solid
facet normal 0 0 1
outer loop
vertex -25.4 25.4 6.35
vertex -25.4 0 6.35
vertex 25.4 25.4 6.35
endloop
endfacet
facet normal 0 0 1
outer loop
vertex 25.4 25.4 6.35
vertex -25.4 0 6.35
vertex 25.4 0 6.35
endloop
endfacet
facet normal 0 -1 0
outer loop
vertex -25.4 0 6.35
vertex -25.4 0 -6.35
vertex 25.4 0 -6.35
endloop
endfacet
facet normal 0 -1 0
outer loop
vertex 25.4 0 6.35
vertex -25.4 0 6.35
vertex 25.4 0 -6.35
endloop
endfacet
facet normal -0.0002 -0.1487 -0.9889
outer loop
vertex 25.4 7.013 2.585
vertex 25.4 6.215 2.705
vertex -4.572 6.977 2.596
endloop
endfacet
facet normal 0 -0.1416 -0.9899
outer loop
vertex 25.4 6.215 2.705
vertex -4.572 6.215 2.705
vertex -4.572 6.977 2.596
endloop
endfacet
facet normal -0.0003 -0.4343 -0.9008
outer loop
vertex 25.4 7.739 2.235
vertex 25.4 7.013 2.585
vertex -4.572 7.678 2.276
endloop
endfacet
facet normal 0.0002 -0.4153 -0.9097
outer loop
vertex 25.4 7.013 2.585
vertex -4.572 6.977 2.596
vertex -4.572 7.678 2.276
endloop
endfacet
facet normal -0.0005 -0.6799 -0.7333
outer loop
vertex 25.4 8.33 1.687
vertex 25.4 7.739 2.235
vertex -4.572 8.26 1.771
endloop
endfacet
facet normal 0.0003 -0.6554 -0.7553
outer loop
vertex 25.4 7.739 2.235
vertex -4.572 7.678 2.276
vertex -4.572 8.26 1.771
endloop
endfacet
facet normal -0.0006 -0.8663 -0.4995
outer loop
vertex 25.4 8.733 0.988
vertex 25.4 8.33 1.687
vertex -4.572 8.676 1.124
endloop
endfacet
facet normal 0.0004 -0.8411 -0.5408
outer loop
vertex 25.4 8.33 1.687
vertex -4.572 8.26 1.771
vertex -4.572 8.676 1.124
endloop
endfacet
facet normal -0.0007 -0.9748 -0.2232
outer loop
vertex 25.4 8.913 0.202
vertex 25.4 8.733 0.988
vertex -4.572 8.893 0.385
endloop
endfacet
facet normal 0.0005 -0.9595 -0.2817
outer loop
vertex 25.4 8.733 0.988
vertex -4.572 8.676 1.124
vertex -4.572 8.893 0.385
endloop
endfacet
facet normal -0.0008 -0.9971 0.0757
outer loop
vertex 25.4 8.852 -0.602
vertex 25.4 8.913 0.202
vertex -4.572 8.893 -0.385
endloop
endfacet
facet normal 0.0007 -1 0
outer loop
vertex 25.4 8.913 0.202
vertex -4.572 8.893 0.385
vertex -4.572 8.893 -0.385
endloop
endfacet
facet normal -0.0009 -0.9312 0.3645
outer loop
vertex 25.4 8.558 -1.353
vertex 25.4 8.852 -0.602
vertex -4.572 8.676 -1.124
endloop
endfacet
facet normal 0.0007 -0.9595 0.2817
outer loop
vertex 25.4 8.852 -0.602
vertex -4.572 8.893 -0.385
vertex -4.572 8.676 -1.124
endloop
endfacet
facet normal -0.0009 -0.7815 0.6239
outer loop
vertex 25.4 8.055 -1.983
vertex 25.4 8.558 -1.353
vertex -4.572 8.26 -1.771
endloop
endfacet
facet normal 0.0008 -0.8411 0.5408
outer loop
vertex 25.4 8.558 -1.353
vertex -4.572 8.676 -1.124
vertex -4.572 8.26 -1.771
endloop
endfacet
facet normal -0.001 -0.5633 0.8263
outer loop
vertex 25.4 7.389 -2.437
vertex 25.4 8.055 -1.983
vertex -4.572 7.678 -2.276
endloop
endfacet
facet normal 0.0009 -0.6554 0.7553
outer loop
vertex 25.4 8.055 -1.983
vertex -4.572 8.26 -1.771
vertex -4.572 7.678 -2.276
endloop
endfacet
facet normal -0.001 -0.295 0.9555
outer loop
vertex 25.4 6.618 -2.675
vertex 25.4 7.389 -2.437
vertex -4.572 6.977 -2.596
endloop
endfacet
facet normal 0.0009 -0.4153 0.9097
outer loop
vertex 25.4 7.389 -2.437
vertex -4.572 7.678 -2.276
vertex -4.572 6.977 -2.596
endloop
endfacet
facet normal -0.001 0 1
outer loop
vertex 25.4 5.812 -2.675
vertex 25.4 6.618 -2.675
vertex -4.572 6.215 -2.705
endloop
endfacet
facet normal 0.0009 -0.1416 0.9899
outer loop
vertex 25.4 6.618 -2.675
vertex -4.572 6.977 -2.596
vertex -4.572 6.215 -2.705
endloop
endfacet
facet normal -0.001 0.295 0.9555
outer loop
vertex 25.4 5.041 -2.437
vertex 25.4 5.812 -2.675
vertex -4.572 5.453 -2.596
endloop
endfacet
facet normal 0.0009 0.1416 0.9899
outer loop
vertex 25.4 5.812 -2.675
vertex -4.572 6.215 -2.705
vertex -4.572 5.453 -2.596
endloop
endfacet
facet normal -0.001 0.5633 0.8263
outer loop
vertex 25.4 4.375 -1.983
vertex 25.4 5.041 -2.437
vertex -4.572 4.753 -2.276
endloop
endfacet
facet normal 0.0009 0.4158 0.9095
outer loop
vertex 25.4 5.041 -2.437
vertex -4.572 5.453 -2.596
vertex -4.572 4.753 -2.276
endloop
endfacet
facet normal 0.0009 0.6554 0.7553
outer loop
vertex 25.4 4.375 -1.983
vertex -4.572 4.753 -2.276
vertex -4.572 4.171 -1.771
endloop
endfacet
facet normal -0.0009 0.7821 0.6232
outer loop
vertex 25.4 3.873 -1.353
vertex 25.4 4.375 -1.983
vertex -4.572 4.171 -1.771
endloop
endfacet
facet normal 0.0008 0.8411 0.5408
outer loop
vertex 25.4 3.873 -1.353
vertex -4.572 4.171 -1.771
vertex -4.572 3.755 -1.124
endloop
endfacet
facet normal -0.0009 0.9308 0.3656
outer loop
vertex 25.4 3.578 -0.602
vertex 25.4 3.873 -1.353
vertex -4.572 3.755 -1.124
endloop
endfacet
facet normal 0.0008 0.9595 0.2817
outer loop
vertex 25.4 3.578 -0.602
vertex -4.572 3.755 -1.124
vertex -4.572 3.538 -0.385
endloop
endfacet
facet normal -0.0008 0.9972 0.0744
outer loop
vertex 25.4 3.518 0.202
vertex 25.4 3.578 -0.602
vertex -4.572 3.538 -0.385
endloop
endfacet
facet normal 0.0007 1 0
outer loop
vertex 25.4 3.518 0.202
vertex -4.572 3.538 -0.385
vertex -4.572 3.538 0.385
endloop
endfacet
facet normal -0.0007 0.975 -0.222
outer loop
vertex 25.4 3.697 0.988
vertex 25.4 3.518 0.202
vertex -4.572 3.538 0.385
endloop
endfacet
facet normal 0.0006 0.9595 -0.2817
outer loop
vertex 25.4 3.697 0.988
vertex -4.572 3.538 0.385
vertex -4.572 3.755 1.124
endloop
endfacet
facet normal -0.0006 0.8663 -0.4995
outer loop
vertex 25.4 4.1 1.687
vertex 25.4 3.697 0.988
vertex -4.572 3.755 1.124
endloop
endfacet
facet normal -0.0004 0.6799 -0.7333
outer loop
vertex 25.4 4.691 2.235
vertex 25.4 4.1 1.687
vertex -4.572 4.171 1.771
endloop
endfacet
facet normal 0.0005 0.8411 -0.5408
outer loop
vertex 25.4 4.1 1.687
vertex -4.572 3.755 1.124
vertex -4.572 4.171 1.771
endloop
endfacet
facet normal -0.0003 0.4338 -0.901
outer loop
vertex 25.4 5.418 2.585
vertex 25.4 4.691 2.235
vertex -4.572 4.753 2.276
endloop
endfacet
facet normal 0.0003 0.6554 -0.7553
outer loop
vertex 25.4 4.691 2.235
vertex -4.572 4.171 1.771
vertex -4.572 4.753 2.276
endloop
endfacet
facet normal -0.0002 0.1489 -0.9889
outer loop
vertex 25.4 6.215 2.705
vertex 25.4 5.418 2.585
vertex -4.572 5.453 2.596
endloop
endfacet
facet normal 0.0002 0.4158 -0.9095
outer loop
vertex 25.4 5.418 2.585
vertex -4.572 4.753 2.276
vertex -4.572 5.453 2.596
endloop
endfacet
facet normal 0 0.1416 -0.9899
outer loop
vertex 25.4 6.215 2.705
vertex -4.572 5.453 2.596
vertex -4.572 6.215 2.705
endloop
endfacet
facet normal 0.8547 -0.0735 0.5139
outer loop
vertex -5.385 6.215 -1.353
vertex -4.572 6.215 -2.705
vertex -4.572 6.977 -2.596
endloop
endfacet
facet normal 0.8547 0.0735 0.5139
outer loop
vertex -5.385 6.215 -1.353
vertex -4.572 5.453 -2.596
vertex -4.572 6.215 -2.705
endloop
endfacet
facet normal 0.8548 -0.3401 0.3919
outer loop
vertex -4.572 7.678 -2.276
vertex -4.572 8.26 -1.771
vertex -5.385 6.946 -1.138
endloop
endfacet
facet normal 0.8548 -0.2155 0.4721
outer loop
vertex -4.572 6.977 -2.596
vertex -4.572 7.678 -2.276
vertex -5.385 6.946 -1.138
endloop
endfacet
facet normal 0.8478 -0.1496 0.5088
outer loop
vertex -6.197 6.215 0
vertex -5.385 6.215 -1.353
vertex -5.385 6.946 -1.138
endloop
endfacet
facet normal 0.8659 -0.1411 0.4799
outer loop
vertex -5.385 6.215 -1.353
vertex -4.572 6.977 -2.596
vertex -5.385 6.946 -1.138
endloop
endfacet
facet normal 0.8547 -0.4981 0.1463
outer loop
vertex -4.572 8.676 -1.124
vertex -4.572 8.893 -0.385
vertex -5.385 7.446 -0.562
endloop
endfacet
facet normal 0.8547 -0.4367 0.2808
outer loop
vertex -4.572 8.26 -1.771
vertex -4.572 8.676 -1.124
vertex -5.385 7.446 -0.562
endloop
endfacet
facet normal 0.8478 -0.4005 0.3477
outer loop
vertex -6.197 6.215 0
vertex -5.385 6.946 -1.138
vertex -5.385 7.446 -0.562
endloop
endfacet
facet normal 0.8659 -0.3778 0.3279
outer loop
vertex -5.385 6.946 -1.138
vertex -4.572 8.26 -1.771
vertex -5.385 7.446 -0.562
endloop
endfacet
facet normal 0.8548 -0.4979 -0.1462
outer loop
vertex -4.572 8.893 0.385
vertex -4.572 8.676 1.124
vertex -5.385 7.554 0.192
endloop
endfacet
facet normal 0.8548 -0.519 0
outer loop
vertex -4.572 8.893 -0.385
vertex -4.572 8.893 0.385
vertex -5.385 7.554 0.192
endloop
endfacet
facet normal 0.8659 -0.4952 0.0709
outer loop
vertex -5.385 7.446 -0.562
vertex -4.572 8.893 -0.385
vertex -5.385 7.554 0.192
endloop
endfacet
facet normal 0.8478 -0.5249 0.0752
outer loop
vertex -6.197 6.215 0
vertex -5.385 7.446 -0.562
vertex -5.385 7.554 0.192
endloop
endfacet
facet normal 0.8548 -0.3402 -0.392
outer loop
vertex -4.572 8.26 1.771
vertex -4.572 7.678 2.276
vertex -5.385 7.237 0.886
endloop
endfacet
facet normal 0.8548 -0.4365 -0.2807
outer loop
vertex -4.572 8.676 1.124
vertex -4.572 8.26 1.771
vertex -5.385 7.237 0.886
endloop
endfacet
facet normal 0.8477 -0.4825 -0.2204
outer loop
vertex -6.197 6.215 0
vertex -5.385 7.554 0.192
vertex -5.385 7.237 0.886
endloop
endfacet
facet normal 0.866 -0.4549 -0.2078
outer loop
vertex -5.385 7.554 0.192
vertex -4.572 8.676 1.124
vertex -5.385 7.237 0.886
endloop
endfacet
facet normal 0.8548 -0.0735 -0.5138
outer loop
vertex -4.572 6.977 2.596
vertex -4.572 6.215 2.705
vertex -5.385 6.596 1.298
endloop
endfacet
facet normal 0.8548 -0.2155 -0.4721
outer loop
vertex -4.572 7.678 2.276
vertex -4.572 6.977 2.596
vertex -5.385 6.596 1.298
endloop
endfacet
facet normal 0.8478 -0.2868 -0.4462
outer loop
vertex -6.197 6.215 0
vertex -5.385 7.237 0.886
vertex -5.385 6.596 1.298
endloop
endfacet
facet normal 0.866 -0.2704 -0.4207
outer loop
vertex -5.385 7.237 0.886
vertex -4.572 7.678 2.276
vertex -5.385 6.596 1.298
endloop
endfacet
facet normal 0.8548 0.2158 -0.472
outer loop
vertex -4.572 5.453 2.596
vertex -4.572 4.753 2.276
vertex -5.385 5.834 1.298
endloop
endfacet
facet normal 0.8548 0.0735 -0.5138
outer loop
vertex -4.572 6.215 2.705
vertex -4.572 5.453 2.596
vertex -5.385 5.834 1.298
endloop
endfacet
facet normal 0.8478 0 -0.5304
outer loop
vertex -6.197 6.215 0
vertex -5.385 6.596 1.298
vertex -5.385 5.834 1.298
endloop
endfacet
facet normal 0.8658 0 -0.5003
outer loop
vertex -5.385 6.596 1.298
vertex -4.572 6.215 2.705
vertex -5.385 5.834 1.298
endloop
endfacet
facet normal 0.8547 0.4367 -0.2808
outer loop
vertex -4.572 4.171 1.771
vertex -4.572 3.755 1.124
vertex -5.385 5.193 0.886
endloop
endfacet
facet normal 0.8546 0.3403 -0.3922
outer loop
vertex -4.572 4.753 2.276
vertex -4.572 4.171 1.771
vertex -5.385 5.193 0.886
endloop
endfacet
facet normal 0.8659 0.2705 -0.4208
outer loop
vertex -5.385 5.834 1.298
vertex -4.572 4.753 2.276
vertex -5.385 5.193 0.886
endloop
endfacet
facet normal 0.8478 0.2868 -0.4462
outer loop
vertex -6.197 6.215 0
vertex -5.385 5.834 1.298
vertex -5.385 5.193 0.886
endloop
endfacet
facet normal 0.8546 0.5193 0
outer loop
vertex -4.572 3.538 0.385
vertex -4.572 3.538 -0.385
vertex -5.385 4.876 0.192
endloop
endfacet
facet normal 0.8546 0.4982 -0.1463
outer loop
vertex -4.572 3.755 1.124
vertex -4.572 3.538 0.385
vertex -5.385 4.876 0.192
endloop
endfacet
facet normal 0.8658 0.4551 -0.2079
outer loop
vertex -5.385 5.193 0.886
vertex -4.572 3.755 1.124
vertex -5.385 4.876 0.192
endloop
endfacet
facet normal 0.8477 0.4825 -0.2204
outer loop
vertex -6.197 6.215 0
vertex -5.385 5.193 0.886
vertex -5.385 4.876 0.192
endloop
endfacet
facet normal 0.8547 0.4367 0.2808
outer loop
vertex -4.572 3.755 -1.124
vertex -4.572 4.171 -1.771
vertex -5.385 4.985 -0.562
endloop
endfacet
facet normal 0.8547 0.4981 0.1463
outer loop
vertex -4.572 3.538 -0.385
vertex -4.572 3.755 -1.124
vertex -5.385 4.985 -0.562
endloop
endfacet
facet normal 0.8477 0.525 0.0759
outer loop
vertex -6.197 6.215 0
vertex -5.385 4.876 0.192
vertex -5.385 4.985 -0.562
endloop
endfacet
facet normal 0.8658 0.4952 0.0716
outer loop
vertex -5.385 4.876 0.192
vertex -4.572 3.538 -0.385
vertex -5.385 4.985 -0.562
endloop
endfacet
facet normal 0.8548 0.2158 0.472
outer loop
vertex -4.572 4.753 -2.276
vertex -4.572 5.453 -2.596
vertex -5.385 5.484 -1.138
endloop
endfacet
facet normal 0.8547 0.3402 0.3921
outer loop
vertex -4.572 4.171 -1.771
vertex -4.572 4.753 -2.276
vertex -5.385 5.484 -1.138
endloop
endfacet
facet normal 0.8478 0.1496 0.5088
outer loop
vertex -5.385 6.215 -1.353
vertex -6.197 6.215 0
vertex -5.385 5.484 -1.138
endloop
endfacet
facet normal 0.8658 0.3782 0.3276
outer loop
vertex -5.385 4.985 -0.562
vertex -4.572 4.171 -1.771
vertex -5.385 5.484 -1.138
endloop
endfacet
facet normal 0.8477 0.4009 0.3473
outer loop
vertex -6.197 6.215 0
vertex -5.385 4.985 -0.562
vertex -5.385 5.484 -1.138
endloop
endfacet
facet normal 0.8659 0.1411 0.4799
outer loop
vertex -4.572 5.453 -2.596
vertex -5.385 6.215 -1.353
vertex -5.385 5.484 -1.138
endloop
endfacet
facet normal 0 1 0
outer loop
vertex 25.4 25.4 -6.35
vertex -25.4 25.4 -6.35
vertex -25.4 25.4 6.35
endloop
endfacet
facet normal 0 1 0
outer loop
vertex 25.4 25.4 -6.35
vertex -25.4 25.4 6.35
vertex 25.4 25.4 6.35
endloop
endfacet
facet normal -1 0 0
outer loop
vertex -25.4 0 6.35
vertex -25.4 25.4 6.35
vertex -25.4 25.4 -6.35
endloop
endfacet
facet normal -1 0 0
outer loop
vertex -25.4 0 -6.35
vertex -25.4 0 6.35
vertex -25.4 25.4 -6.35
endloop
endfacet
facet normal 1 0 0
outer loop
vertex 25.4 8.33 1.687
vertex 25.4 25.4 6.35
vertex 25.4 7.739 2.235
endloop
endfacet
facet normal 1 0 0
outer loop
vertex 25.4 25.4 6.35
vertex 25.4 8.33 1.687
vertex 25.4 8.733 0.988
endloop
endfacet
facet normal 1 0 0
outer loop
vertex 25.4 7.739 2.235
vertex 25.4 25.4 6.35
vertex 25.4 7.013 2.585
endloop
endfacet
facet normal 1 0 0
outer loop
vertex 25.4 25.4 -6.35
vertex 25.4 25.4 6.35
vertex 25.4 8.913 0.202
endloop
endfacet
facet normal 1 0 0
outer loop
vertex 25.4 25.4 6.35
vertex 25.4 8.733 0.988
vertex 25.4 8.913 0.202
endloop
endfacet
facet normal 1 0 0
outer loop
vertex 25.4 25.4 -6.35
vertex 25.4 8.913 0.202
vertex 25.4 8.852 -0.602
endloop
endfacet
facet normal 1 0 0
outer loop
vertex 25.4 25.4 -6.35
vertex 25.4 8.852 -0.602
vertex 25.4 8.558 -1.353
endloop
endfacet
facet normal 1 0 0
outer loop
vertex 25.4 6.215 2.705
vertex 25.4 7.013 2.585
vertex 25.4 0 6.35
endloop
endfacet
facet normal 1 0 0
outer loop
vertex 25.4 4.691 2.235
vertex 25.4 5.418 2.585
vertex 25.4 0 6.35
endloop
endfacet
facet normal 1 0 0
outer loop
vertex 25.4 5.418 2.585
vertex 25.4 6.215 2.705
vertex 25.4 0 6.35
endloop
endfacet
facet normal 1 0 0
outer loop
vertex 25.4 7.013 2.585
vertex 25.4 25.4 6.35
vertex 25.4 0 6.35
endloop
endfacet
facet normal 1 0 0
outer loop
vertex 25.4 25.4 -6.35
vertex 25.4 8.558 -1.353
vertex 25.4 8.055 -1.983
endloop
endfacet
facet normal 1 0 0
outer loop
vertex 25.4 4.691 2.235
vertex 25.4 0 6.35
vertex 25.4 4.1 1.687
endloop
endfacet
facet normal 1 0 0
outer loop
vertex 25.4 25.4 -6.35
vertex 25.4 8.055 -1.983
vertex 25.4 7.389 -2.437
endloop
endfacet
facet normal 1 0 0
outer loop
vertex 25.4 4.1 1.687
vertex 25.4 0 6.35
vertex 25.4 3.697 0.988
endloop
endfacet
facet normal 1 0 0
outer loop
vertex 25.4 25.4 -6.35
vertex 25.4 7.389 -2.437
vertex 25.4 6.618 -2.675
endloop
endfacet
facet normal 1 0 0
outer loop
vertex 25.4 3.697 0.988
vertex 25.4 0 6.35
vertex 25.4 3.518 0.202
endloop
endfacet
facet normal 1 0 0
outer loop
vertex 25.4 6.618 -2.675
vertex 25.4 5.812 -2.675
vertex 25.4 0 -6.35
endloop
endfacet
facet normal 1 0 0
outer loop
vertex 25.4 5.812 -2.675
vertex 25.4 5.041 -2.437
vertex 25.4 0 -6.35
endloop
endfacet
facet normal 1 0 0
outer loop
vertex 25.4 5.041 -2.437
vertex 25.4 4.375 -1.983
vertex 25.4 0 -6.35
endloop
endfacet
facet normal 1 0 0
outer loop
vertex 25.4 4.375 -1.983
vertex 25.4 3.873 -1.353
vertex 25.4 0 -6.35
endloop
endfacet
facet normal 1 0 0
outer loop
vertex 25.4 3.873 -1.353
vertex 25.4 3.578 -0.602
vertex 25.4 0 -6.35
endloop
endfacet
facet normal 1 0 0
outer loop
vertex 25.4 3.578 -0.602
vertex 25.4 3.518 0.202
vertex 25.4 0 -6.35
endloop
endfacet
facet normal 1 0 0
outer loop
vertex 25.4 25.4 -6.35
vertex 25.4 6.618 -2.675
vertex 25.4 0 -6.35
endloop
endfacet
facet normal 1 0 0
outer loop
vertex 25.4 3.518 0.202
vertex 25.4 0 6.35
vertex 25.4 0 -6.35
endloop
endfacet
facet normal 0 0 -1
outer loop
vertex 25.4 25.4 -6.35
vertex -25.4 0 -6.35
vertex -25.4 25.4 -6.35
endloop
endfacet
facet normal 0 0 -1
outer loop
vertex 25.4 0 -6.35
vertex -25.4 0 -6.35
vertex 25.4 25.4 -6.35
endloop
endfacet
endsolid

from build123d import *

# Parameters (mm, degrees)
SKETCH1_W                   = 50.8
SKETCH1_H                   = 12.7
BOSS_EXTRUDE1_DEPTH         = 25.4
F_1_4_28_TAPPED_HOLE1_D     = 5.4102
F_1_4_28_TAPPED_HOLE1_DEPTH = 29.972
F_1_4_28_TAPPED_HOLE1_TIP   = 1.625388061


with BuildPart() as part:
    # Sketch1 → Boss-Extrude1 (new body)
    with BuildSketch(Plane(origin=(0, 0, 0), x_dir=(1, 0, 0), z_dir=(0, 1, 0))):
        Rectangle(SKETCH1_W, SKETCH1_H)
    extrude(amount=BOSS_EXTRUDE1_DEPTH)

    # 1/4-28 Tapped Hole1
    with Locations(Plane(origin=(25.4, 0, 0), x_dir=(0, 0, -1), z_dir=(1, 0, 0))):
        with Locations((0, 6.215198177)):
            Hole(F_1_4_28_TAPPED_HOLE1_D / 2, depth=F_1_4_28_TAPPED_HOLE1_DEPTH)
            with Locations((0, 0, -(F_1_4_28_TAPPED_HOLE1_DEPTH + F_1_4_28_TAPPED_HOLE1_TIP / 2))):  # 118° drill point
                Cone(0, F_1_4_28_TAPPED_HOLE1_D / 2, F_1_4_28_TAPPED_HOLE1_TIP, mode=Mode.SUBTRACT)


solid = part.part
